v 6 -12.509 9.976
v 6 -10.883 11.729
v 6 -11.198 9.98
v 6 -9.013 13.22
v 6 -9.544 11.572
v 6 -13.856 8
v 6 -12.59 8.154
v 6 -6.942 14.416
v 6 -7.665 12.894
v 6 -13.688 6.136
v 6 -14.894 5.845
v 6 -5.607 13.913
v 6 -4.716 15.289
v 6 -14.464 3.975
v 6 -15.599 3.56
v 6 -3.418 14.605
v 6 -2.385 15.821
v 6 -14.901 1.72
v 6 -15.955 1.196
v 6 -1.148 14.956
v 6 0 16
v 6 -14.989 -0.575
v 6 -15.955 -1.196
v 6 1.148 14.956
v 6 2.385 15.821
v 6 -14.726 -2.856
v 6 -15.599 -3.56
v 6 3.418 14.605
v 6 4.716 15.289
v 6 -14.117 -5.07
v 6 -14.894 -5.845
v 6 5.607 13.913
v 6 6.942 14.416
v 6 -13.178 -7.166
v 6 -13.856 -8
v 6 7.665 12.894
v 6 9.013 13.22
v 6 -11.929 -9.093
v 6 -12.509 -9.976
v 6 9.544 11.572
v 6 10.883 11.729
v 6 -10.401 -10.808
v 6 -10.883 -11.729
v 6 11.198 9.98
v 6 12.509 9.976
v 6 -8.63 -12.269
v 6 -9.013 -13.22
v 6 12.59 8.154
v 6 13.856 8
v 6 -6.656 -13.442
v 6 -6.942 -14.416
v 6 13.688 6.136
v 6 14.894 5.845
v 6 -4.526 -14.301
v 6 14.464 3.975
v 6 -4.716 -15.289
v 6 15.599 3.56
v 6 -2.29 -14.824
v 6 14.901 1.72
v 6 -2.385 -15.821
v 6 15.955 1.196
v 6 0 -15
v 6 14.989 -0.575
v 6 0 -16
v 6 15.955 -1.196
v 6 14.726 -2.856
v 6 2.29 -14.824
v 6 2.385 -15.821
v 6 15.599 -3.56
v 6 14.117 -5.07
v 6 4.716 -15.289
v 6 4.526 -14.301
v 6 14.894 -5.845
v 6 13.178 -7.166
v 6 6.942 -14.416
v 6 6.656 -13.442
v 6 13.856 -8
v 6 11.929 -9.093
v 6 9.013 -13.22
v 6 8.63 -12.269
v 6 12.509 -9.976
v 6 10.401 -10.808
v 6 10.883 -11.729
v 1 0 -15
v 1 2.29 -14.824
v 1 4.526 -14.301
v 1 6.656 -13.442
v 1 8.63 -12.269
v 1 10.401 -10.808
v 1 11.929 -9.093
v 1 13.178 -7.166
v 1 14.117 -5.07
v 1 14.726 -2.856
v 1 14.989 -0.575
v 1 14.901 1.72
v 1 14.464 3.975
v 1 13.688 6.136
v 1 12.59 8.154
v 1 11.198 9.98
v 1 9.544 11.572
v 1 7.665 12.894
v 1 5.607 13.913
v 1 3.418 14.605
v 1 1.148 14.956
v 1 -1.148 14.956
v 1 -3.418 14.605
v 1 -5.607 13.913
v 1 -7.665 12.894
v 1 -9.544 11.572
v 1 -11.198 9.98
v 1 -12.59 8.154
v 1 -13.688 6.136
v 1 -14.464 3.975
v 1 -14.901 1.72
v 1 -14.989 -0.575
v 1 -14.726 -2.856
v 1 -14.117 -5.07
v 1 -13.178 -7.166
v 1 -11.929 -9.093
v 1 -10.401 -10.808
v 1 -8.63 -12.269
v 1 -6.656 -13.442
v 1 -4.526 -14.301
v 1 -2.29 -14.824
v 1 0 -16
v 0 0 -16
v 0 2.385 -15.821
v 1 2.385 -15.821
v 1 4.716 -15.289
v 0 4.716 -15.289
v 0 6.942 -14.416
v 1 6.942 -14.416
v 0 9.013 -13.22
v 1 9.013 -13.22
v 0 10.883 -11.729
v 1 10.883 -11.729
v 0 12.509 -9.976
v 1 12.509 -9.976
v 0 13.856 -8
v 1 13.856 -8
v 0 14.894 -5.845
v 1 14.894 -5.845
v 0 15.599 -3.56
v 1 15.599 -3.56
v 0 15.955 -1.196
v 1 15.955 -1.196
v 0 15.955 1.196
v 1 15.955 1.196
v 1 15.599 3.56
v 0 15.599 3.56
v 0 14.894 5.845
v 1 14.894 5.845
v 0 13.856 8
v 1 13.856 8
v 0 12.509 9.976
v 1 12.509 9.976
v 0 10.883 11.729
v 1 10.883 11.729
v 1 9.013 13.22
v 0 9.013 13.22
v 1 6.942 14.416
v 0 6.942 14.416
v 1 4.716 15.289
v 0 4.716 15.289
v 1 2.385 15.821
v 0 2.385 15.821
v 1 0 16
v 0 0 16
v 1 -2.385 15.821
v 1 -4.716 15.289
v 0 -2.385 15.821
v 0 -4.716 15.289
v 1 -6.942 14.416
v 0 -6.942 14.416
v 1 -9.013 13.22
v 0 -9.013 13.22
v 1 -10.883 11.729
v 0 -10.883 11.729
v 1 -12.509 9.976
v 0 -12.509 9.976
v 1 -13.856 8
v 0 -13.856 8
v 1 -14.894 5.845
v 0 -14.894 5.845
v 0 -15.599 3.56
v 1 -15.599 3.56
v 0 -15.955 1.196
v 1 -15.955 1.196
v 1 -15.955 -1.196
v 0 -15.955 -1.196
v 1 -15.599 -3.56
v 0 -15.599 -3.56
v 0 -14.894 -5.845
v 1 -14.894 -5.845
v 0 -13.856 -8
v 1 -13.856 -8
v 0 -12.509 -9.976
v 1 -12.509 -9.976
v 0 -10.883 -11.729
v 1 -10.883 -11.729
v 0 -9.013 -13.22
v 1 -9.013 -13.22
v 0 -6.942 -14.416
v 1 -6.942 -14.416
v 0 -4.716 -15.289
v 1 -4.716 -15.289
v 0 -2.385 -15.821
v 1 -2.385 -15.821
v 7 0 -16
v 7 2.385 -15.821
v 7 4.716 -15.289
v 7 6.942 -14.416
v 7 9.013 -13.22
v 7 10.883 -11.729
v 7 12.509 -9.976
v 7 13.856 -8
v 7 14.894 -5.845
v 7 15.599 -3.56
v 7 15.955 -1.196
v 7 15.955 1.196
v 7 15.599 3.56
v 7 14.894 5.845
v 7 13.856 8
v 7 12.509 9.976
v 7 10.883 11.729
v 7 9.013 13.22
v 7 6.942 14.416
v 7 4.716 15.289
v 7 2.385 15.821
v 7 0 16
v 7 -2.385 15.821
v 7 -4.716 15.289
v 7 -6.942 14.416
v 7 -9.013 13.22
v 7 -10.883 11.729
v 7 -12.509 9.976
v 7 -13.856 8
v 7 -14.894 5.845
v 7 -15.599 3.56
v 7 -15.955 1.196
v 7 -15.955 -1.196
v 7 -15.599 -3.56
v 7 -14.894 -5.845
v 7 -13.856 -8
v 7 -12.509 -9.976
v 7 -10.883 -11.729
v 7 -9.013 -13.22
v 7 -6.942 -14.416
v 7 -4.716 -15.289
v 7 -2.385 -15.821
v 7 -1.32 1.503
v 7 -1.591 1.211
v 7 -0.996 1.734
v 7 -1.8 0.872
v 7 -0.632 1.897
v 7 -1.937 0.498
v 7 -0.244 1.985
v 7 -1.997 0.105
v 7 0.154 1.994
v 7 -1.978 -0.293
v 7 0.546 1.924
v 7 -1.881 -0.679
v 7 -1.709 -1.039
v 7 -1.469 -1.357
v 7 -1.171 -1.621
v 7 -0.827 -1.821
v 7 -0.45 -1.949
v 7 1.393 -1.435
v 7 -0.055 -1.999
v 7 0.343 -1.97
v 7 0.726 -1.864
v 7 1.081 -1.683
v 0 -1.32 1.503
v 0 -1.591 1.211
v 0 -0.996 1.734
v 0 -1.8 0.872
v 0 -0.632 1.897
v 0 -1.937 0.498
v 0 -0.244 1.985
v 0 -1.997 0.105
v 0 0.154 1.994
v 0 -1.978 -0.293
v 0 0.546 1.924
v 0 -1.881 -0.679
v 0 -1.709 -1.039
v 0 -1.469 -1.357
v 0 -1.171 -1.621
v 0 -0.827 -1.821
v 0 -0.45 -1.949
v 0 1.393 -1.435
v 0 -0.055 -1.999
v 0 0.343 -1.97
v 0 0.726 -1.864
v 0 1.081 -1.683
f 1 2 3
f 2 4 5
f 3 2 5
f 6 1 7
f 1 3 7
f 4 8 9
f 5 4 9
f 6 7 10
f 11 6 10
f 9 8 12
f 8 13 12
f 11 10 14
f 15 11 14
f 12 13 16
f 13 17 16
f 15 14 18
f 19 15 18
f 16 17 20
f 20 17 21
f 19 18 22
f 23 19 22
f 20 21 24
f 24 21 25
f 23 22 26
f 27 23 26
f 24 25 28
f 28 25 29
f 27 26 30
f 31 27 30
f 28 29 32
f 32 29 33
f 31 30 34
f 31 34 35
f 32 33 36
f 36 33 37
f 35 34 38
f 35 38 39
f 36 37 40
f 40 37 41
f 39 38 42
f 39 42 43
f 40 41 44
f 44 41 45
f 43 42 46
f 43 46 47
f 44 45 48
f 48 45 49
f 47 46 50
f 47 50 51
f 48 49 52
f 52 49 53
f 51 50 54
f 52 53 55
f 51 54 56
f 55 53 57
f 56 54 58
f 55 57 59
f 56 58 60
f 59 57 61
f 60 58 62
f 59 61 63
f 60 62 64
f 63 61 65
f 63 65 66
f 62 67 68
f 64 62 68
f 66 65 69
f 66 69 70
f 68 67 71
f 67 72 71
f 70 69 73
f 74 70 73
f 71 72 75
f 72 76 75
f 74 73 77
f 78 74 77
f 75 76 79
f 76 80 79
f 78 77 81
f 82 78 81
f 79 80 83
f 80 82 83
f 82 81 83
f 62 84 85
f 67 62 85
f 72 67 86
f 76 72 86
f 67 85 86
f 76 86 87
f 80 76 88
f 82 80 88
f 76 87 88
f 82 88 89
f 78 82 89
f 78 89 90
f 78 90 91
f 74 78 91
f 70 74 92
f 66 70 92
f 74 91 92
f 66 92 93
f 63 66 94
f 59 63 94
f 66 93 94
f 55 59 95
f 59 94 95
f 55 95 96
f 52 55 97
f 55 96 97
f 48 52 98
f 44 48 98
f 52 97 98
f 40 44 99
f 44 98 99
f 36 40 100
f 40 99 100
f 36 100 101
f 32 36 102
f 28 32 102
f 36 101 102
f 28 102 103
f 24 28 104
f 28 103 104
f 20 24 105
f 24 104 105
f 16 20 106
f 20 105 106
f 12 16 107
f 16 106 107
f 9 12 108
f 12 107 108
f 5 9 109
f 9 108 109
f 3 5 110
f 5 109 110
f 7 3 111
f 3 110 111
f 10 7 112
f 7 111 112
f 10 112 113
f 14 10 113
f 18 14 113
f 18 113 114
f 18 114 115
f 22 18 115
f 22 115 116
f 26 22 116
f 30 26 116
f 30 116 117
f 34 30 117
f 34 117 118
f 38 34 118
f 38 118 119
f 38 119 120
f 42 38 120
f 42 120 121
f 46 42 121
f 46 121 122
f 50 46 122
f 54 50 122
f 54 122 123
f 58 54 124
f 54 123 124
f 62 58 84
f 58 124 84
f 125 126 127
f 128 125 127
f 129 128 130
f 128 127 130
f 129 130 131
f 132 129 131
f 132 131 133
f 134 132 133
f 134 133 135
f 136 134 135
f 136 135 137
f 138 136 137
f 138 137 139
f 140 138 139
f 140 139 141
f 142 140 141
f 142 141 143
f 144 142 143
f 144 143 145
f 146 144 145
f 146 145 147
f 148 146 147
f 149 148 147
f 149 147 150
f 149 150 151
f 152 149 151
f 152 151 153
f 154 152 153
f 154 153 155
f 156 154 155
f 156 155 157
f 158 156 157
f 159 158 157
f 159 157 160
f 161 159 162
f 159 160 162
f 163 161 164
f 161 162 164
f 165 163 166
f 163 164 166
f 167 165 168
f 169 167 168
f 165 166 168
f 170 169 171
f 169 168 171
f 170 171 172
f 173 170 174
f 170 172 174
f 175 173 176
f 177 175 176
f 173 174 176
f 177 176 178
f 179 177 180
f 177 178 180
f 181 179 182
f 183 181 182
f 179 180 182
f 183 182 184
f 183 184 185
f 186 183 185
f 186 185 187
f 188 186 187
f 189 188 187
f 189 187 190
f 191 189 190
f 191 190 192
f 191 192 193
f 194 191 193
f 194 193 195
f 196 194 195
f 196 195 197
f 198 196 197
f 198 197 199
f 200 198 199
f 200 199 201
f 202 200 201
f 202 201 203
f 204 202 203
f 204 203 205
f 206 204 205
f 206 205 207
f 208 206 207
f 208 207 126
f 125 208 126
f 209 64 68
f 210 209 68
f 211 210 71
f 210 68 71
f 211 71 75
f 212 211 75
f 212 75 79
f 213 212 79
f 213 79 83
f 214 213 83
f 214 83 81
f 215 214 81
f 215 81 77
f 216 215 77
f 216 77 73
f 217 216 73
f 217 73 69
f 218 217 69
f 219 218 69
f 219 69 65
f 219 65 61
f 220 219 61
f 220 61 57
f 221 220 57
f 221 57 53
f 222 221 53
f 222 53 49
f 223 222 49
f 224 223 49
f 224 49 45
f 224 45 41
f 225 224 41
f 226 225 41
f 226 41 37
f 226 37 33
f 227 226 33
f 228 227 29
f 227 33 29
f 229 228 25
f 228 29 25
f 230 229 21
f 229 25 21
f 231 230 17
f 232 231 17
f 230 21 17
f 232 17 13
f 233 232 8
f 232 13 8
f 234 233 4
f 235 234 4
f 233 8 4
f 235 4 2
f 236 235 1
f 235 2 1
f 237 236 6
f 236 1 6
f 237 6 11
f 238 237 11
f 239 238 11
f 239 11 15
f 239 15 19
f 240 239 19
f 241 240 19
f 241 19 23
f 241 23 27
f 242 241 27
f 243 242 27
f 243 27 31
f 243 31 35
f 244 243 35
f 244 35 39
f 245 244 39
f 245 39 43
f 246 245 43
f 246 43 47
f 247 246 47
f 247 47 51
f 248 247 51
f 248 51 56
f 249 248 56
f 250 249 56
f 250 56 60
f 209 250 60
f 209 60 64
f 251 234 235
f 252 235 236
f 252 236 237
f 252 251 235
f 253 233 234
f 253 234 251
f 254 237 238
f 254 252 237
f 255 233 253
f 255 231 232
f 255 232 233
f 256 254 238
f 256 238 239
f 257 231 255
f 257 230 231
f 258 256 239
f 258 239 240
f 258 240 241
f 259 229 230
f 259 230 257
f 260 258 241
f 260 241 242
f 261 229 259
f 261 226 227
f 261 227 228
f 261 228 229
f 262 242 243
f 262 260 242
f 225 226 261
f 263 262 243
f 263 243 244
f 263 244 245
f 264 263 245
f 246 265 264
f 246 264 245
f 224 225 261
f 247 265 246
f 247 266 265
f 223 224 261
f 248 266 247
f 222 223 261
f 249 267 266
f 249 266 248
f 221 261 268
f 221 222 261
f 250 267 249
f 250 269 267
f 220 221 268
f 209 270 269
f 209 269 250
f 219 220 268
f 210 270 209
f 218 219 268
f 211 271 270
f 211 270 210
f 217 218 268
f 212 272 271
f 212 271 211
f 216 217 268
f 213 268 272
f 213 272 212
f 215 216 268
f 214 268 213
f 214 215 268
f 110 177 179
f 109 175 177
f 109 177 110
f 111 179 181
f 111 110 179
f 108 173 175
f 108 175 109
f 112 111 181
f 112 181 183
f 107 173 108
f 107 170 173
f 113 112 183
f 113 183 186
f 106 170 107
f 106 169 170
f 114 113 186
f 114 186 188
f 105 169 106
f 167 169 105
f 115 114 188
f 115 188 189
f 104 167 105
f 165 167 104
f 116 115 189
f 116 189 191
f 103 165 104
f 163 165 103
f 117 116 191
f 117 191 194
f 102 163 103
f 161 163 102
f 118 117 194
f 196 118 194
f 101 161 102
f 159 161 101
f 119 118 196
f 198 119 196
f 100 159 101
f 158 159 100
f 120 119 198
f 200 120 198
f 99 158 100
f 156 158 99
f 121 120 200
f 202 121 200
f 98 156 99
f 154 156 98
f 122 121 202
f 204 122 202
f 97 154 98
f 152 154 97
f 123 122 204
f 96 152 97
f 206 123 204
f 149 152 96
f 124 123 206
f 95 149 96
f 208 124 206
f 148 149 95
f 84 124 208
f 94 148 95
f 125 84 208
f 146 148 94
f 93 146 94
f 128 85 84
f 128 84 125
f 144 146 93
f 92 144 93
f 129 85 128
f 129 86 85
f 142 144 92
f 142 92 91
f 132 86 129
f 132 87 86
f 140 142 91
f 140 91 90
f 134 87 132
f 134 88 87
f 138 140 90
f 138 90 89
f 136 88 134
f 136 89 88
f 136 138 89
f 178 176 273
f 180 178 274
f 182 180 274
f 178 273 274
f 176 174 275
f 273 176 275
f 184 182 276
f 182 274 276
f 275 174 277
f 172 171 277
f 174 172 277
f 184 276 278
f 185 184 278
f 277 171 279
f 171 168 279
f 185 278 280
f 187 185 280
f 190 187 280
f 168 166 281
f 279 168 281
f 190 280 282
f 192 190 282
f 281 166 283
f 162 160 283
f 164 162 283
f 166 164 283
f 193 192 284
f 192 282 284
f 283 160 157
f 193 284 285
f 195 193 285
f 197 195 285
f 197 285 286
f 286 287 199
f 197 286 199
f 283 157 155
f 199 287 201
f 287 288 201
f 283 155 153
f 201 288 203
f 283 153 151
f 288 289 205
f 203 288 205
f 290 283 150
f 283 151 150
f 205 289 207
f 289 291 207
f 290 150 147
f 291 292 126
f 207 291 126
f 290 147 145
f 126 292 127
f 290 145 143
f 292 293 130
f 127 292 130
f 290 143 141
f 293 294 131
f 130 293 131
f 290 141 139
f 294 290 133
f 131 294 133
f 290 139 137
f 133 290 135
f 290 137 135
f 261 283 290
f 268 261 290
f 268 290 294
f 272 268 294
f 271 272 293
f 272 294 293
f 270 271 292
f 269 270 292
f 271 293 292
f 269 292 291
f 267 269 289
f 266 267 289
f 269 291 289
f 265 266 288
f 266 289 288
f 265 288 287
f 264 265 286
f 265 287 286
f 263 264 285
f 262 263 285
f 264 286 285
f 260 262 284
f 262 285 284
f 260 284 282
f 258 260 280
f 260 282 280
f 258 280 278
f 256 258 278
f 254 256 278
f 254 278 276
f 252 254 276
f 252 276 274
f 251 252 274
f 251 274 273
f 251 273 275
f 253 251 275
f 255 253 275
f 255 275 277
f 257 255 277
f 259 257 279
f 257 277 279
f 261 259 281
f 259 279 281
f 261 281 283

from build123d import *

# Parameters (mm, degrees)
SKETCH1_R           = 16
BOSS_EXTRUDE1_DEPTH = 7
CUT_EXTRUDE1_START  = -5
SKETCH3_R           = 16
SKETCH3_R_2         = 15
CUT_EXTRUDE1_DEPTH  = 5


with BuildPart() as part:
    # Sketch1 → Boss-Extrude1 (new body)
    with BuildSketch(Plane(origin=(0, 0, 0), x_dir=(0, 0, -1), z_dir=(1, 0, 0))):
        Circle(SKETCH1_R)
        with BuildLine():
            Line((-1.923932435, 0.546336878), (1.435107833, 1.393005925))
            ThreePointArc((1.435107833, 1.393005925), (0.488824602, -1.939342803), (-1.923932435, 0.546336878))
        make_face(mode=Mode.SUBTRACT)
    extrude(amount=BOSS_EXTRUDE1_DEPTH)

    # Sketch3 → Cut-Extrude1 (cut)
    with BuildSketch(Plane(origin=(6, 0, 0), x_dir=(0, 0, -1), z_dir=(1, 0, 0)).offset(CUT_EXTRUDE1_START)):
        Circle(SKETCH3_R)
        Circle(SKETCH3_R_2, mode=Mode.SUBTRACT)
    extrude(amount=CUT_EXTRUDE1_DEPTH, mode=Mode.SUBTRACT)


solid = part.part
